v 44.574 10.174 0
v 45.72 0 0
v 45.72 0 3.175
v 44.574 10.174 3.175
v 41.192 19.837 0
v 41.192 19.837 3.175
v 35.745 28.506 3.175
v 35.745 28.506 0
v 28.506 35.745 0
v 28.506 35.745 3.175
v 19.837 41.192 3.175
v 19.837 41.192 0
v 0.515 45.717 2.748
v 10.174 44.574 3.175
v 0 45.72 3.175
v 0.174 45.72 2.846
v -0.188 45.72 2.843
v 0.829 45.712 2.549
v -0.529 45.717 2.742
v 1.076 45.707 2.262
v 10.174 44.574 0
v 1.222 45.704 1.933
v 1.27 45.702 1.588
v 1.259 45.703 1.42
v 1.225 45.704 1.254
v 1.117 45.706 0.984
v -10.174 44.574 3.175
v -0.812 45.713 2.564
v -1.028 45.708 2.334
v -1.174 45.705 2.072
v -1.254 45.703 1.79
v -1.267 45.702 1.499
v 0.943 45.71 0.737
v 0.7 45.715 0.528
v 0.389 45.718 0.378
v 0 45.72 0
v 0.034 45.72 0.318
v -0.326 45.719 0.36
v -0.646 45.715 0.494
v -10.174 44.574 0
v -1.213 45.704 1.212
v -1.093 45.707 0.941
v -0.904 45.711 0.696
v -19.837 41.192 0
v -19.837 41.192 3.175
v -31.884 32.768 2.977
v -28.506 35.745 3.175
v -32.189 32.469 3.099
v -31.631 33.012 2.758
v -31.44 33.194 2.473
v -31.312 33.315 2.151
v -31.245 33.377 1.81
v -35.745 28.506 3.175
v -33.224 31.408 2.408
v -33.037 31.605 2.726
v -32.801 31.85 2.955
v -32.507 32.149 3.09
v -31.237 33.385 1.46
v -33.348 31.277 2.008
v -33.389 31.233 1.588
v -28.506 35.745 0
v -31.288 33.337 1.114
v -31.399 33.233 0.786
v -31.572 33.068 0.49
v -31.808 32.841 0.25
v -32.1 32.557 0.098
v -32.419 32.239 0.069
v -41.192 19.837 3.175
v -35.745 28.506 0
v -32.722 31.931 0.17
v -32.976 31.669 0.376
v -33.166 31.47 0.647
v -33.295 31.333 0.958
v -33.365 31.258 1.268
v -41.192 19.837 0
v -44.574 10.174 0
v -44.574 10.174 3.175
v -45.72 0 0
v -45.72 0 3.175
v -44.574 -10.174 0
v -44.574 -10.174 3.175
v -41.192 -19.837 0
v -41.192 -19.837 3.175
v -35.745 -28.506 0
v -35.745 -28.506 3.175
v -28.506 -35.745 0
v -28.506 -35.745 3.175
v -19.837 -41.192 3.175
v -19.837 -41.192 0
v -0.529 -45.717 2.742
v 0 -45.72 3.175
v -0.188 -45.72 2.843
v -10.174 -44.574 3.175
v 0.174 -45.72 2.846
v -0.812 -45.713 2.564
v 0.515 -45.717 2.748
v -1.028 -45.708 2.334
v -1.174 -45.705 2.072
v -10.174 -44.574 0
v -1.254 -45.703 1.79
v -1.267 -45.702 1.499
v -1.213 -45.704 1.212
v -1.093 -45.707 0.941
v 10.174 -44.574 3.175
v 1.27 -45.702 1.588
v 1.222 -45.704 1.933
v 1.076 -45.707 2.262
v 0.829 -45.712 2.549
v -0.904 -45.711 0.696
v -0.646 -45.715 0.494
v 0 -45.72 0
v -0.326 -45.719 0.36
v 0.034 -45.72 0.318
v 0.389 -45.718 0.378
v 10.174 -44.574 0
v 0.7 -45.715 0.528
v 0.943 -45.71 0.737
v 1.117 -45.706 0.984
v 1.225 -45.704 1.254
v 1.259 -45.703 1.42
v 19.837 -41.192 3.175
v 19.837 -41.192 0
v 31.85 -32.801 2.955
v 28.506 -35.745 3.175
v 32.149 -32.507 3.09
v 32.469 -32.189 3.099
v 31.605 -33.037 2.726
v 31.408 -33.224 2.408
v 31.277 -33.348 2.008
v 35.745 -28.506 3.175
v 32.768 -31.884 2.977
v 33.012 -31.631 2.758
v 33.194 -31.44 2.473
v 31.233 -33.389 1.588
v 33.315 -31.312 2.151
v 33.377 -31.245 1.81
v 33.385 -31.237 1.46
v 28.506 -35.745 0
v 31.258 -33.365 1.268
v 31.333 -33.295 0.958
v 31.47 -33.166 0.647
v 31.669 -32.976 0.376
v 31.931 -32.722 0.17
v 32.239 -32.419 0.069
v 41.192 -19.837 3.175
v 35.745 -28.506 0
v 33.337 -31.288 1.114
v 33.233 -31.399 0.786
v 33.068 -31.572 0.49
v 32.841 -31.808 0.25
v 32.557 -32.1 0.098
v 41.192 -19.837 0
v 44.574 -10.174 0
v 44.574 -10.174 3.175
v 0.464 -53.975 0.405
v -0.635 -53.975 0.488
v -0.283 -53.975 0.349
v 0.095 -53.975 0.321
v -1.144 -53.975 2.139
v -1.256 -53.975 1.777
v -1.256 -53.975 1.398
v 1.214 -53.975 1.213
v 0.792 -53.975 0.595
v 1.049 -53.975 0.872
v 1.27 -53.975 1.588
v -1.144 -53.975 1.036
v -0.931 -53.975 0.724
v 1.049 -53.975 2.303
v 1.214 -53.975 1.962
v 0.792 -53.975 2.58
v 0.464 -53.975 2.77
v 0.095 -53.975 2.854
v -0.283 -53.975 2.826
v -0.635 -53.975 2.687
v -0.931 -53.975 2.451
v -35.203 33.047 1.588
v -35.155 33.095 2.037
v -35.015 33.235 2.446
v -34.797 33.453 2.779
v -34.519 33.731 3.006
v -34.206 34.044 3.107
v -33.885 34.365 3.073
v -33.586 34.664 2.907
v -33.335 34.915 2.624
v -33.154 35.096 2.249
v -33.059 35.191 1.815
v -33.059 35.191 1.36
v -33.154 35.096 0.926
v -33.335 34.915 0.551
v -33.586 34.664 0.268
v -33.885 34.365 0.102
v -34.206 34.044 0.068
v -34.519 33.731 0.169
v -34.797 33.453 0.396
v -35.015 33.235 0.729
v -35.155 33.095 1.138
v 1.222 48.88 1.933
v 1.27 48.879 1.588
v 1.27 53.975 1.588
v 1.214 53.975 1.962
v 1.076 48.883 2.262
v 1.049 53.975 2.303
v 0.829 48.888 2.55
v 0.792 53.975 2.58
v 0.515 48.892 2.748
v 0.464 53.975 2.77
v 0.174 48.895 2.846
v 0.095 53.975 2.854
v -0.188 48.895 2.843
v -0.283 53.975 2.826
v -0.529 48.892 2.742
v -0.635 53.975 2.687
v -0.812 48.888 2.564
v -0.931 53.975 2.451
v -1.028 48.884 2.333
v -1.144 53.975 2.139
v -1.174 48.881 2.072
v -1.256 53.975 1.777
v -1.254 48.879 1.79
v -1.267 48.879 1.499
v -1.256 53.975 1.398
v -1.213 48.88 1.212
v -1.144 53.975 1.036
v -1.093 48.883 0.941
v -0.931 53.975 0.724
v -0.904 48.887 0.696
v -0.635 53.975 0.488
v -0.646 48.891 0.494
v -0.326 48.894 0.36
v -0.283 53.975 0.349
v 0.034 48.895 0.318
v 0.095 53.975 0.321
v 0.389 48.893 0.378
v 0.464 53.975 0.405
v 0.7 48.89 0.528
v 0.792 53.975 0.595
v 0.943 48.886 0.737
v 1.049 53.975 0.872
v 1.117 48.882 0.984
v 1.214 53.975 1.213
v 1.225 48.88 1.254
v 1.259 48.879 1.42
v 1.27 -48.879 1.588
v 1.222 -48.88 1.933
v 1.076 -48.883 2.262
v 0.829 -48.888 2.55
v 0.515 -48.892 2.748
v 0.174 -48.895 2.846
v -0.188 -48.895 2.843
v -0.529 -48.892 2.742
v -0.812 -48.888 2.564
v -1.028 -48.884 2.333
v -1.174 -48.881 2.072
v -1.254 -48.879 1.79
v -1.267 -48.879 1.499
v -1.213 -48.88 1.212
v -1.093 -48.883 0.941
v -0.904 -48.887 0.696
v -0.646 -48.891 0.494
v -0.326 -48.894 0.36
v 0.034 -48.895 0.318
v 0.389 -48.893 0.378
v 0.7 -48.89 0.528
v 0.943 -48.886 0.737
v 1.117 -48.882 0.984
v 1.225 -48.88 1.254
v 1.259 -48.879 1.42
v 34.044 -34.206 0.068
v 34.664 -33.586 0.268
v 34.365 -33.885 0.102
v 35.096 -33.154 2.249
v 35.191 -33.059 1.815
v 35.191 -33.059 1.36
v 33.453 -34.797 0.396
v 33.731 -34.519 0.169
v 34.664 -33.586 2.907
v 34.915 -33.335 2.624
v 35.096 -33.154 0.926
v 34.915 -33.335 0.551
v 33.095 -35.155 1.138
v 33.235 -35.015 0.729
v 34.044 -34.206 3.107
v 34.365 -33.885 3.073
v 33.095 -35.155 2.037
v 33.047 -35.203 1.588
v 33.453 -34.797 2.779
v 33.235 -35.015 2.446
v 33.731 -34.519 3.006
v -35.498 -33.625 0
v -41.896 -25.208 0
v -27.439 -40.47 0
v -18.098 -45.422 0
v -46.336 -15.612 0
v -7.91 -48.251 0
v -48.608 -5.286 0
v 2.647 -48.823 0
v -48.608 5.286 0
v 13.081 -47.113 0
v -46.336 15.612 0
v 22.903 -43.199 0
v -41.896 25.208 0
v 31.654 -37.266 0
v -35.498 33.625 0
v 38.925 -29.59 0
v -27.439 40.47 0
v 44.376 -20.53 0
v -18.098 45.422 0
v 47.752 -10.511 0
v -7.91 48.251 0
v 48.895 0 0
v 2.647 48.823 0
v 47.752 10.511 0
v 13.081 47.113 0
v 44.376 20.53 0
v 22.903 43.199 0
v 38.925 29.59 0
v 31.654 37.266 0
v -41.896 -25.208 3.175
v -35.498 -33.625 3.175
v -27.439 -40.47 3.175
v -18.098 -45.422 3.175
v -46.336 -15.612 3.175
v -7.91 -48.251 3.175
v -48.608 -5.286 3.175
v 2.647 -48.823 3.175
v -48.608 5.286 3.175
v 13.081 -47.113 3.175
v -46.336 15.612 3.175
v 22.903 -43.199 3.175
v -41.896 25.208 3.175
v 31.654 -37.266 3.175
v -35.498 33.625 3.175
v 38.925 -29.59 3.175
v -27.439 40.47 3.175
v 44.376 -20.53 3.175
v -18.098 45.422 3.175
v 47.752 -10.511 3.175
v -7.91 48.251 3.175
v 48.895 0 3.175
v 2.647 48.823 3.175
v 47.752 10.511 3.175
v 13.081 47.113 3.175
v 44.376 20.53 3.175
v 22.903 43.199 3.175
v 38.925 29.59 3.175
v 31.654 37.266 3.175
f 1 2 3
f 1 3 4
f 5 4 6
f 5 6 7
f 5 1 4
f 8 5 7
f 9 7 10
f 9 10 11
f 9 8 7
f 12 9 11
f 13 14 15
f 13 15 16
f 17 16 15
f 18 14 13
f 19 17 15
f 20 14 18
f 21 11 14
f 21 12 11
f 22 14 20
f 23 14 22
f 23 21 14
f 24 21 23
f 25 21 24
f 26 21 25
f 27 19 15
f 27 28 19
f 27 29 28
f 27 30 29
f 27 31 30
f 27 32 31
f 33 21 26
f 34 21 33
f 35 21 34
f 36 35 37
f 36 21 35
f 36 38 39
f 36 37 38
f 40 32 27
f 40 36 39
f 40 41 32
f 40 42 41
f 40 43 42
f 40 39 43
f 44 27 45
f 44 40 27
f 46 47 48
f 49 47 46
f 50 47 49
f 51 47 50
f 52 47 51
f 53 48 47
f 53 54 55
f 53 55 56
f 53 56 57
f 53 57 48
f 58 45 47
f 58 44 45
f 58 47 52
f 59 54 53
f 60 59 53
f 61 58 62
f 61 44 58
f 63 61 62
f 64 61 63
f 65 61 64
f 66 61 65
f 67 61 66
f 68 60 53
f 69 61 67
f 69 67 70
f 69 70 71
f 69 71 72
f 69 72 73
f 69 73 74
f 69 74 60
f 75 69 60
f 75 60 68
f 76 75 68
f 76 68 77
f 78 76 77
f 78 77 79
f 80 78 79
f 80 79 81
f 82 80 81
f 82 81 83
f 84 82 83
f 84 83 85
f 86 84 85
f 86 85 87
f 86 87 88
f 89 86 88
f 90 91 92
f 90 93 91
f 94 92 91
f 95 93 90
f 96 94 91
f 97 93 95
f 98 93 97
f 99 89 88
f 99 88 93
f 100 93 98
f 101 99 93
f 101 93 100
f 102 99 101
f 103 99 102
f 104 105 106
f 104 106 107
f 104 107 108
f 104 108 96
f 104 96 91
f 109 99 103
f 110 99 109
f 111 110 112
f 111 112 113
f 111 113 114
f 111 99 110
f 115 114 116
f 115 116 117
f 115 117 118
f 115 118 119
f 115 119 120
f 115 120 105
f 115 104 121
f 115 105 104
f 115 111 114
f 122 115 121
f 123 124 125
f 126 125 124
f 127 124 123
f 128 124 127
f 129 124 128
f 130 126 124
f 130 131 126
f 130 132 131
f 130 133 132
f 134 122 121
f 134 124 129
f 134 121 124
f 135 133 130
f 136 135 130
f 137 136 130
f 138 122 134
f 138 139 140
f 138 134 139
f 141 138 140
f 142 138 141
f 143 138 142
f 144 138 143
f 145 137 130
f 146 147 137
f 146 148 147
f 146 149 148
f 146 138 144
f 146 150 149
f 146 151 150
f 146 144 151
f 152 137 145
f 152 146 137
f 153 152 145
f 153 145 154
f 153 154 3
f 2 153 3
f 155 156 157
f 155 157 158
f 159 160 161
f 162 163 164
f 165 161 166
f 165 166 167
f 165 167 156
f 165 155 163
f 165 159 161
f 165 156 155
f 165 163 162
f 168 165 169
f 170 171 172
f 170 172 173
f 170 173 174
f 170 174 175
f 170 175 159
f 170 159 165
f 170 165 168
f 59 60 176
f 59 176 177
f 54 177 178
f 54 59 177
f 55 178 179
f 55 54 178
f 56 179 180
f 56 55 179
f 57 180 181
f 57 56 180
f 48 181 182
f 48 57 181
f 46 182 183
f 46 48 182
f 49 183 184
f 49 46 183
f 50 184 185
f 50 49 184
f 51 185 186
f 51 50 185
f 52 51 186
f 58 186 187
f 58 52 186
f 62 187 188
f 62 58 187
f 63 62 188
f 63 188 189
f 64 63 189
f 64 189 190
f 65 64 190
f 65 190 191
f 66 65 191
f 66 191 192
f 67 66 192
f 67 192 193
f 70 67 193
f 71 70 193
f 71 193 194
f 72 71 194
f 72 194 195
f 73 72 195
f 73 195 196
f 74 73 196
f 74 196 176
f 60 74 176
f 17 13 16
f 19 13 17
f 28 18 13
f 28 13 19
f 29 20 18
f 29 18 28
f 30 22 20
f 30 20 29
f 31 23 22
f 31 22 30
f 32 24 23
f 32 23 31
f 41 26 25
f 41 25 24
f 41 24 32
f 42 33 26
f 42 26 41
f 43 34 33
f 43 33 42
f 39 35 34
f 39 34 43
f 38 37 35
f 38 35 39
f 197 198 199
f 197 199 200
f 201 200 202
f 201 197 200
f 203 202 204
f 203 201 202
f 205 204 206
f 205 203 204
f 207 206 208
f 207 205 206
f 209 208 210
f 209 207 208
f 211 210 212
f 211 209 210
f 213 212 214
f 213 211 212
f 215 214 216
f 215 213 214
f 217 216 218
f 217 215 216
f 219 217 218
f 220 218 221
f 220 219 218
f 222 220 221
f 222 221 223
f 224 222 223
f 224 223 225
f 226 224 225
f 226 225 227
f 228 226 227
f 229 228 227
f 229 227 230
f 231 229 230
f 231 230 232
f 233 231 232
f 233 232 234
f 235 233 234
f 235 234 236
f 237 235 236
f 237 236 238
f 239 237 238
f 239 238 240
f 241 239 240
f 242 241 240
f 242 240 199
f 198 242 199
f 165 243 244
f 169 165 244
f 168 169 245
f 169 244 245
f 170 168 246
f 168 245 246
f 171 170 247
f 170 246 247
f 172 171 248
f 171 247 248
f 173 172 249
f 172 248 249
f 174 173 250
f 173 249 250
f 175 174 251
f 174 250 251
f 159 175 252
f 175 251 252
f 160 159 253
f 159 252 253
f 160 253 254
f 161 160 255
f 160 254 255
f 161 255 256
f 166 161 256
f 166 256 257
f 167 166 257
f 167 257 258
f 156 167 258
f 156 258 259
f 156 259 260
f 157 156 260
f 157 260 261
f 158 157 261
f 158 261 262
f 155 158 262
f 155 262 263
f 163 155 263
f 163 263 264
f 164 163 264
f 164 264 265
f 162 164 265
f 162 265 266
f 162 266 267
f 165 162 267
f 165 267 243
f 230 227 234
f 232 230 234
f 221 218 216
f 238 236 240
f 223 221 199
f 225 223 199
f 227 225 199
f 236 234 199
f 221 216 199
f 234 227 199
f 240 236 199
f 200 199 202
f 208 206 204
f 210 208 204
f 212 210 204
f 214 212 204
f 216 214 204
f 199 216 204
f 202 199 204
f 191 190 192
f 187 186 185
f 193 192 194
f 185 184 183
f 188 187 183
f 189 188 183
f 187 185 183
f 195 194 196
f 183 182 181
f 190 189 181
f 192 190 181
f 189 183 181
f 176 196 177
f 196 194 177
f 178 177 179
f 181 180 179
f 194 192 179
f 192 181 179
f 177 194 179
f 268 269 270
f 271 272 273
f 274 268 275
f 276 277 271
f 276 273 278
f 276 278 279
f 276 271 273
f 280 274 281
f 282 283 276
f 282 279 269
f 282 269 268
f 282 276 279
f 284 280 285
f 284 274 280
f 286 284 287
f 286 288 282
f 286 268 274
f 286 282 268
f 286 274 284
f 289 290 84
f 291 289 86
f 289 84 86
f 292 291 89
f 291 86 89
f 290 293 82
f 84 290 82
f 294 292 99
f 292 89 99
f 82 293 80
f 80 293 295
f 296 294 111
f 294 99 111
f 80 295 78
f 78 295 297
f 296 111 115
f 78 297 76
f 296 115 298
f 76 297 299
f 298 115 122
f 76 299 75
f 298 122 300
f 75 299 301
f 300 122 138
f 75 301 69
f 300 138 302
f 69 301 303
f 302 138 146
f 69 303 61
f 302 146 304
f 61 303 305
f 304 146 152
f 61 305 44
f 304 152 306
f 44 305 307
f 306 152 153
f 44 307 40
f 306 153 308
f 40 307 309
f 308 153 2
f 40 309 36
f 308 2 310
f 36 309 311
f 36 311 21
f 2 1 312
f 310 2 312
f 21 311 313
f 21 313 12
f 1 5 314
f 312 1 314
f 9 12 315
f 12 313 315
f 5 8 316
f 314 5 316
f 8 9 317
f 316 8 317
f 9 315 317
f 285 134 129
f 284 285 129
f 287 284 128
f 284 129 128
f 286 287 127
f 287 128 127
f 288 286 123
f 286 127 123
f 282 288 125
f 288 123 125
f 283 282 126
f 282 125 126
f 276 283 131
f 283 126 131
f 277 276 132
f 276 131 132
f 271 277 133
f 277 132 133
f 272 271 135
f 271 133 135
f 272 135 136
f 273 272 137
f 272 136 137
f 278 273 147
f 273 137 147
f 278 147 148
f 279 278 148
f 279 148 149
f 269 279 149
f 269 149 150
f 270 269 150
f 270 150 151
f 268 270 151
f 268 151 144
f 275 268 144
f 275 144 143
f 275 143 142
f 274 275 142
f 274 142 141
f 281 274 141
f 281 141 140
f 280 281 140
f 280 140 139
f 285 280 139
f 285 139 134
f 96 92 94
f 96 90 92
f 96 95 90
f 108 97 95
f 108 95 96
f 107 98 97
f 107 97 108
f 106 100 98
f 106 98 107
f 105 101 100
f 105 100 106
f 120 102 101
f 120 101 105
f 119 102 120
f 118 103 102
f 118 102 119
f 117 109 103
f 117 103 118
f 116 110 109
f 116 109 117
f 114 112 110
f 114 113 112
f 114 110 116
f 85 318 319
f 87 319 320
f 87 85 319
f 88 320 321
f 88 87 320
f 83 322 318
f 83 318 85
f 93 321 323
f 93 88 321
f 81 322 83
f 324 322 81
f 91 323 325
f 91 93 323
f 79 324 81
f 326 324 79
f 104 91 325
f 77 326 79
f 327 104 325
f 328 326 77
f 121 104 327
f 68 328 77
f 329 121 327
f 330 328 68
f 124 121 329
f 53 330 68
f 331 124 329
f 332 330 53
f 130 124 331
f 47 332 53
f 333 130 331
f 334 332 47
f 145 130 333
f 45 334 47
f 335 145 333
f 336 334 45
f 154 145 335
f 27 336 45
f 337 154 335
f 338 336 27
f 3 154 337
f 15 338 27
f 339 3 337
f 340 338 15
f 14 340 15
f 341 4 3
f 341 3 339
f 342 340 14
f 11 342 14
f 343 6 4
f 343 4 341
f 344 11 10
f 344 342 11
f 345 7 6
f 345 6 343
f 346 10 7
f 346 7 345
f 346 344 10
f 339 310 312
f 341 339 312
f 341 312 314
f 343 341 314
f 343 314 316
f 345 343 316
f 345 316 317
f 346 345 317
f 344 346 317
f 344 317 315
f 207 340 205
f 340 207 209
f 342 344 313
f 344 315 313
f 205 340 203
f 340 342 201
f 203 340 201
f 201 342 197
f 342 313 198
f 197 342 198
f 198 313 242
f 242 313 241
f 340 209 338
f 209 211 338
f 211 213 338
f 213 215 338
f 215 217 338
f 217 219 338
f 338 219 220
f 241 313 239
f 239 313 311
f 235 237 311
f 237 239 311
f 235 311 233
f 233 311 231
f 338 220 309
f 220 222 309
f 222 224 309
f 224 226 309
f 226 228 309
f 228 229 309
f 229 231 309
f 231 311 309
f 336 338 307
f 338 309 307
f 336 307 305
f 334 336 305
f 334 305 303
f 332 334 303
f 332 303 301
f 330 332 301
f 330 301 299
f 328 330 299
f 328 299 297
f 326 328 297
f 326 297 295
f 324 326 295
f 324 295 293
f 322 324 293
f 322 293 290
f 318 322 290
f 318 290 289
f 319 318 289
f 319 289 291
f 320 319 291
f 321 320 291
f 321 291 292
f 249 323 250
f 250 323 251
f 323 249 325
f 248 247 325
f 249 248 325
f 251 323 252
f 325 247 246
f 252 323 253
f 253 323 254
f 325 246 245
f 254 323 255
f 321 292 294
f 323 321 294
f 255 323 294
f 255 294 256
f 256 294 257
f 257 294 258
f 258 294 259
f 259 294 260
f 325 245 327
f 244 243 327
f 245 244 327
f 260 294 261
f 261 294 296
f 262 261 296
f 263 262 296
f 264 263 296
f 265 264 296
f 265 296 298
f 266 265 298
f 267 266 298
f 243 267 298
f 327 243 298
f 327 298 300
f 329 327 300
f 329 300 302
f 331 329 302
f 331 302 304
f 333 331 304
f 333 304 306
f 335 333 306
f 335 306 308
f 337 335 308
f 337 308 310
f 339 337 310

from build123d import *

# Parameters (mm, degrees)
F0_R           = 48.895
F0_R_2         = 45.72
F1_DEPTH       = 3.175
F2_R           = 1.27
F3_DEPTH       = 53.975
F3_DEPTH_BACK  = 53.975
F4_R           = 45.72
F5_DEPTH       = 25.4
F9_R           = 1.524
F10_DEPTH      = 48.26
F10_DEPTH_BACK = 48.26


with BuildPart() as f1:
    # F0 (on Top) → F1 (new body)
    with BuildSketch(Plane.XY):
        Circle(F0_R)
        Circle(F0_R_2, mode=Mode.SUBTRACT)
    extrude(amount=F1_DEPTH)

    # F2 (on Front) → F3 (join, two sides)
    with BuildSketch(Plane.XZ) as f3_sk:
        with Locations((0, 1.5875)):
            Circle(F2_R)
    extrude(amount=F3_DEPTH)
    extrude(f3_sk.sketch, amount=-F3_DEPTH_BACK)

    # F4 (on Top) → F5 (cut)
    with BuildSketch(Plane.XY):
        Circle(F4_R)
    extrude(amount=F5_DEPTH, mode=Mode.SUBTRACT)

    # F9 (on face) → F10 (cut, two sides)
    with BuildSketch(Plane(origin=(0, 0, 0), x_dir=(-0.7071067812, -0.7071067812, 0), z_dir=(-0.7071067812, 0.7071067812, 0))) as f10_sk:
        with Locations((0, 1.5875)):
            Circle(F9_R)
    extrude(amount=-F10_DEPTH, mode=Mode.SUBTRACT)
    extrude(f10_sk.sketch, amount=F10_DEPTH_BACK, mode=Mode.SUBTRACT)


solid = f1.part
